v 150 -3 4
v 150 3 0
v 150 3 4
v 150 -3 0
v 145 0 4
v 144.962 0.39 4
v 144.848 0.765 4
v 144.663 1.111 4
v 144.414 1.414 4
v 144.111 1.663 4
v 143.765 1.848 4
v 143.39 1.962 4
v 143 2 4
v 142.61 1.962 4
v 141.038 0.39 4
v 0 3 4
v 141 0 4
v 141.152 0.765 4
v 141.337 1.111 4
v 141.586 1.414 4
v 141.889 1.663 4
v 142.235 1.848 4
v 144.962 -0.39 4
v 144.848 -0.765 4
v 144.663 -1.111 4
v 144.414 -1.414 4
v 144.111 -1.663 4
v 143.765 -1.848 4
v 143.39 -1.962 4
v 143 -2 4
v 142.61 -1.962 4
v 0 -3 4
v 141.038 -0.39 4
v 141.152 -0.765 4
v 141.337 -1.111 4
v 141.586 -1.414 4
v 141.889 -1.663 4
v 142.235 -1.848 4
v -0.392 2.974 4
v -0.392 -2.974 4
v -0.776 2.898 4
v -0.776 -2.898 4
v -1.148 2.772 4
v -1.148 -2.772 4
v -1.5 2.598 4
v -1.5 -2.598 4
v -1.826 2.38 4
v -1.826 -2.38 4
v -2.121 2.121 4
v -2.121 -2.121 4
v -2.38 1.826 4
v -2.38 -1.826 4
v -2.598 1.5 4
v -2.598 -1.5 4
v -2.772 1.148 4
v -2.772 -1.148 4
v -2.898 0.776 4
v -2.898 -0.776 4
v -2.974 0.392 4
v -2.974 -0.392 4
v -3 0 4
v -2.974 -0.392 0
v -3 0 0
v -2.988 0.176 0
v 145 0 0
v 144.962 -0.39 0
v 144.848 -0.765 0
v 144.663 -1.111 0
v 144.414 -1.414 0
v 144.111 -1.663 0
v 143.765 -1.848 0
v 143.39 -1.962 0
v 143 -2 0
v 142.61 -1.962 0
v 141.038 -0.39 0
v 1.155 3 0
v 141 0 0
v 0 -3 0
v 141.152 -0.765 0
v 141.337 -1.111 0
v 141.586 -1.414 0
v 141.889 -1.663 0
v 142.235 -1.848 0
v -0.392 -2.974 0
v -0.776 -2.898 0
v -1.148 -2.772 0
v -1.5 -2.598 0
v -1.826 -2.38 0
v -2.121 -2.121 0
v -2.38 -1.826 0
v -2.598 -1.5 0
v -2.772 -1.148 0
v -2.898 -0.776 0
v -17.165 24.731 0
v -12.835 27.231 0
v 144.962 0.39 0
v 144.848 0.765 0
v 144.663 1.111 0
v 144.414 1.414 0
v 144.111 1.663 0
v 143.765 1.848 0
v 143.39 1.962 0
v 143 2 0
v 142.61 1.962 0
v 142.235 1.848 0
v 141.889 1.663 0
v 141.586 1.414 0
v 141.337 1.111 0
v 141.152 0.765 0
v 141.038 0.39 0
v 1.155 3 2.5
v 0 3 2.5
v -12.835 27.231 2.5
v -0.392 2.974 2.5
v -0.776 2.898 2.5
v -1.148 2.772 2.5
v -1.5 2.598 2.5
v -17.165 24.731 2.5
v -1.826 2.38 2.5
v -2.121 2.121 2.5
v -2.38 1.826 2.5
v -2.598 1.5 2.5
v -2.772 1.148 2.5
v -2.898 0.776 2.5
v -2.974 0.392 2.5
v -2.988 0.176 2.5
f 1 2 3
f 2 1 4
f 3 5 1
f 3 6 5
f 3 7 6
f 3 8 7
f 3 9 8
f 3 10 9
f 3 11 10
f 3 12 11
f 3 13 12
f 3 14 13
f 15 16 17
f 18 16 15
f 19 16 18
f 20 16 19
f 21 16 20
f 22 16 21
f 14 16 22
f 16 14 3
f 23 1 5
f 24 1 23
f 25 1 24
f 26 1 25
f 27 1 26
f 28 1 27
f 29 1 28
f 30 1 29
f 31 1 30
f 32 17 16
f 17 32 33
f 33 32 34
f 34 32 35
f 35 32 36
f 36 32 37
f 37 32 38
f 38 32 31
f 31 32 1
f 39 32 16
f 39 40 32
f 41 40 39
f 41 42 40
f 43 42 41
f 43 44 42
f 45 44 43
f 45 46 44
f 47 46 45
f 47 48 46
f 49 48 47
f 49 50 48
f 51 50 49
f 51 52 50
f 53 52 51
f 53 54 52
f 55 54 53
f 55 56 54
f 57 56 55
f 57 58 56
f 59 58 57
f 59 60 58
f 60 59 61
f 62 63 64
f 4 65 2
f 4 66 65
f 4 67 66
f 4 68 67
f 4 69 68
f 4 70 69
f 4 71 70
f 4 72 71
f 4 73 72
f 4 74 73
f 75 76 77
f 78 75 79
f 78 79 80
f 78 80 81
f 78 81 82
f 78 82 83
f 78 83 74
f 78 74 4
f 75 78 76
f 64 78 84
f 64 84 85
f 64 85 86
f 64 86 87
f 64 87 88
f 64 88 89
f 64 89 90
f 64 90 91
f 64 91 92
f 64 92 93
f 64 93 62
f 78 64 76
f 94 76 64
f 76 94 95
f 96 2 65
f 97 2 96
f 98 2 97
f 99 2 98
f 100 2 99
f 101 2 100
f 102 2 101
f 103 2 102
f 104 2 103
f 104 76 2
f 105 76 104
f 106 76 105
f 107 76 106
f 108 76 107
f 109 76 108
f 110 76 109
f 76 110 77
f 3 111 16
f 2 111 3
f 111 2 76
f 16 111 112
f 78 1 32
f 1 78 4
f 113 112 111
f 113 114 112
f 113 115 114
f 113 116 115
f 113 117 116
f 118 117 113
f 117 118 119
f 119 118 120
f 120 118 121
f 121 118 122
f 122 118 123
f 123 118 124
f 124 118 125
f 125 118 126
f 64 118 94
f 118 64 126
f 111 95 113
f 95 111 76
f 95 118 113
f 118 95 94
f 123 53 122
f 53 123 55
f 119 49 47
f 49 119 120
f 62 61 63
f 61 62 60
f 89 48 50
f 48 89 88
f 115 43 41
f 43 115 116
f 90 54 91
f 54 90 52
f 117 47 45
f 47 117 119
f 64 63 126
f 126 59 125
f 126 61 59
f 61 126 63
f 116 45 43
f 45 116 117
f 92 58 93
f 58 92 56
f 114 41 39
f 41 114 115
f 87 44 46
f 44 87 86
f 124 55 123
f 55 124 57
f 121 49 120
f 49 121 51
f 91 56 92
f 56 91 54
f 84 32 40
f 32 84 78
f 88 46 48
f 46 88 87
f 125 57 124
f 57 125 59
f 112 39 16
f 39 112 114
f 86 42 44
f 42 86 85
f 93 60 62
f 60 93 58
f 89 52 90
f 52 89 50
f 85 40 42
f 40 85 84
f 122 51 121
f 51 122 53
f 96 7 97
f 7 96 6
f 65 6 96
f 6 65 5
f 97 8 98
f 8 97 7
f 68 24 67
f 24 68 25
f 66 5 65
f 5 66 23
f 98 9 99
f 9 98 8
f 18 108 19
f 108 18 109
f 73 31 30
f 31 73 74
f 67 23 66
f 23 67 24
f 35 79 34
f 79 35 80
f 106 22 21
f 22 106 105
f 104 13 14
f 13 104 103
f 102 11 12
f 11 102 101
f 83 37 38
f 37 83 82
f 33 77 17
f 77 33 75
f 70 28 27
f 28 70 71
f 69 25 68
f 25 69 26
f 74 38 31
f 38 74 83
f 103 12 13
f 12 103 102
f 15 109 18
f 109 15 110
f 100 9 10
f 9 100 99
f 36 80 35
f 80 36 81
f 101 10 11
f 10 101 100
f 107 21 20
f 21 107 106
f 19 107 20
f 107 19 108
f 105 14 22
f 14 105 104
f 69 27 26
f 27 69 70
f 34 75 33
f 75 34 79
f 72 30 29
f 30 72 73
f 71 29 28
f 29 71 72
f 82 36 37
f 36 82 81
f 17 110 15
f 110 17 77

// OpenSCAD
// KNOWN-WRONG PART (must fail): the foot is 30 mm long instead of 40
// L-shaped ("hockey-stick") cell spreader for plating bacteria
// Category: tools. A flat handle and a thinner spreading foot at 120 degrees, joined by a round
// boss; the foot's bed side is the smooth spreading face. Hanging hole at the handle end.
// Print: PETG or PP, lying flat, 0.15 mm layers, 100 % infill; sterilise with 70 % ethanol
// (or autoclave only if printed in PP).
// SPDX-License-Identifier: CERN-OHL-P-2.0

/* [Spreader] */
handle = [150, 6, 4];     // length (X), width (Y), thickness (Z)
foot = [30, 5, 2.5];      // length along its centre line, width, thickness
foot_angle = 120;         // counter-clockwise from +X, seen from above
boss_d = 6;               // joins the bars at the origin, full handle thickness
hole_d = 4;
hole_x = 143;

/* [Hidden] */
eps = 0.01;

difference() {
    union() {
        translate([0, -handle.y / 2, 0]) cube(handle);
        rotate([0, 0, foot_angle]) translate([0, -foot.y / 2, 0]) cube(foot);
        cylinder(d = boss_d, h = handle.z, $fn = 48);
    }
    translate([hole_x, 0, -1]) cylinder(d = hole_d, h = handle.z + 2, $fn = 32);
}
